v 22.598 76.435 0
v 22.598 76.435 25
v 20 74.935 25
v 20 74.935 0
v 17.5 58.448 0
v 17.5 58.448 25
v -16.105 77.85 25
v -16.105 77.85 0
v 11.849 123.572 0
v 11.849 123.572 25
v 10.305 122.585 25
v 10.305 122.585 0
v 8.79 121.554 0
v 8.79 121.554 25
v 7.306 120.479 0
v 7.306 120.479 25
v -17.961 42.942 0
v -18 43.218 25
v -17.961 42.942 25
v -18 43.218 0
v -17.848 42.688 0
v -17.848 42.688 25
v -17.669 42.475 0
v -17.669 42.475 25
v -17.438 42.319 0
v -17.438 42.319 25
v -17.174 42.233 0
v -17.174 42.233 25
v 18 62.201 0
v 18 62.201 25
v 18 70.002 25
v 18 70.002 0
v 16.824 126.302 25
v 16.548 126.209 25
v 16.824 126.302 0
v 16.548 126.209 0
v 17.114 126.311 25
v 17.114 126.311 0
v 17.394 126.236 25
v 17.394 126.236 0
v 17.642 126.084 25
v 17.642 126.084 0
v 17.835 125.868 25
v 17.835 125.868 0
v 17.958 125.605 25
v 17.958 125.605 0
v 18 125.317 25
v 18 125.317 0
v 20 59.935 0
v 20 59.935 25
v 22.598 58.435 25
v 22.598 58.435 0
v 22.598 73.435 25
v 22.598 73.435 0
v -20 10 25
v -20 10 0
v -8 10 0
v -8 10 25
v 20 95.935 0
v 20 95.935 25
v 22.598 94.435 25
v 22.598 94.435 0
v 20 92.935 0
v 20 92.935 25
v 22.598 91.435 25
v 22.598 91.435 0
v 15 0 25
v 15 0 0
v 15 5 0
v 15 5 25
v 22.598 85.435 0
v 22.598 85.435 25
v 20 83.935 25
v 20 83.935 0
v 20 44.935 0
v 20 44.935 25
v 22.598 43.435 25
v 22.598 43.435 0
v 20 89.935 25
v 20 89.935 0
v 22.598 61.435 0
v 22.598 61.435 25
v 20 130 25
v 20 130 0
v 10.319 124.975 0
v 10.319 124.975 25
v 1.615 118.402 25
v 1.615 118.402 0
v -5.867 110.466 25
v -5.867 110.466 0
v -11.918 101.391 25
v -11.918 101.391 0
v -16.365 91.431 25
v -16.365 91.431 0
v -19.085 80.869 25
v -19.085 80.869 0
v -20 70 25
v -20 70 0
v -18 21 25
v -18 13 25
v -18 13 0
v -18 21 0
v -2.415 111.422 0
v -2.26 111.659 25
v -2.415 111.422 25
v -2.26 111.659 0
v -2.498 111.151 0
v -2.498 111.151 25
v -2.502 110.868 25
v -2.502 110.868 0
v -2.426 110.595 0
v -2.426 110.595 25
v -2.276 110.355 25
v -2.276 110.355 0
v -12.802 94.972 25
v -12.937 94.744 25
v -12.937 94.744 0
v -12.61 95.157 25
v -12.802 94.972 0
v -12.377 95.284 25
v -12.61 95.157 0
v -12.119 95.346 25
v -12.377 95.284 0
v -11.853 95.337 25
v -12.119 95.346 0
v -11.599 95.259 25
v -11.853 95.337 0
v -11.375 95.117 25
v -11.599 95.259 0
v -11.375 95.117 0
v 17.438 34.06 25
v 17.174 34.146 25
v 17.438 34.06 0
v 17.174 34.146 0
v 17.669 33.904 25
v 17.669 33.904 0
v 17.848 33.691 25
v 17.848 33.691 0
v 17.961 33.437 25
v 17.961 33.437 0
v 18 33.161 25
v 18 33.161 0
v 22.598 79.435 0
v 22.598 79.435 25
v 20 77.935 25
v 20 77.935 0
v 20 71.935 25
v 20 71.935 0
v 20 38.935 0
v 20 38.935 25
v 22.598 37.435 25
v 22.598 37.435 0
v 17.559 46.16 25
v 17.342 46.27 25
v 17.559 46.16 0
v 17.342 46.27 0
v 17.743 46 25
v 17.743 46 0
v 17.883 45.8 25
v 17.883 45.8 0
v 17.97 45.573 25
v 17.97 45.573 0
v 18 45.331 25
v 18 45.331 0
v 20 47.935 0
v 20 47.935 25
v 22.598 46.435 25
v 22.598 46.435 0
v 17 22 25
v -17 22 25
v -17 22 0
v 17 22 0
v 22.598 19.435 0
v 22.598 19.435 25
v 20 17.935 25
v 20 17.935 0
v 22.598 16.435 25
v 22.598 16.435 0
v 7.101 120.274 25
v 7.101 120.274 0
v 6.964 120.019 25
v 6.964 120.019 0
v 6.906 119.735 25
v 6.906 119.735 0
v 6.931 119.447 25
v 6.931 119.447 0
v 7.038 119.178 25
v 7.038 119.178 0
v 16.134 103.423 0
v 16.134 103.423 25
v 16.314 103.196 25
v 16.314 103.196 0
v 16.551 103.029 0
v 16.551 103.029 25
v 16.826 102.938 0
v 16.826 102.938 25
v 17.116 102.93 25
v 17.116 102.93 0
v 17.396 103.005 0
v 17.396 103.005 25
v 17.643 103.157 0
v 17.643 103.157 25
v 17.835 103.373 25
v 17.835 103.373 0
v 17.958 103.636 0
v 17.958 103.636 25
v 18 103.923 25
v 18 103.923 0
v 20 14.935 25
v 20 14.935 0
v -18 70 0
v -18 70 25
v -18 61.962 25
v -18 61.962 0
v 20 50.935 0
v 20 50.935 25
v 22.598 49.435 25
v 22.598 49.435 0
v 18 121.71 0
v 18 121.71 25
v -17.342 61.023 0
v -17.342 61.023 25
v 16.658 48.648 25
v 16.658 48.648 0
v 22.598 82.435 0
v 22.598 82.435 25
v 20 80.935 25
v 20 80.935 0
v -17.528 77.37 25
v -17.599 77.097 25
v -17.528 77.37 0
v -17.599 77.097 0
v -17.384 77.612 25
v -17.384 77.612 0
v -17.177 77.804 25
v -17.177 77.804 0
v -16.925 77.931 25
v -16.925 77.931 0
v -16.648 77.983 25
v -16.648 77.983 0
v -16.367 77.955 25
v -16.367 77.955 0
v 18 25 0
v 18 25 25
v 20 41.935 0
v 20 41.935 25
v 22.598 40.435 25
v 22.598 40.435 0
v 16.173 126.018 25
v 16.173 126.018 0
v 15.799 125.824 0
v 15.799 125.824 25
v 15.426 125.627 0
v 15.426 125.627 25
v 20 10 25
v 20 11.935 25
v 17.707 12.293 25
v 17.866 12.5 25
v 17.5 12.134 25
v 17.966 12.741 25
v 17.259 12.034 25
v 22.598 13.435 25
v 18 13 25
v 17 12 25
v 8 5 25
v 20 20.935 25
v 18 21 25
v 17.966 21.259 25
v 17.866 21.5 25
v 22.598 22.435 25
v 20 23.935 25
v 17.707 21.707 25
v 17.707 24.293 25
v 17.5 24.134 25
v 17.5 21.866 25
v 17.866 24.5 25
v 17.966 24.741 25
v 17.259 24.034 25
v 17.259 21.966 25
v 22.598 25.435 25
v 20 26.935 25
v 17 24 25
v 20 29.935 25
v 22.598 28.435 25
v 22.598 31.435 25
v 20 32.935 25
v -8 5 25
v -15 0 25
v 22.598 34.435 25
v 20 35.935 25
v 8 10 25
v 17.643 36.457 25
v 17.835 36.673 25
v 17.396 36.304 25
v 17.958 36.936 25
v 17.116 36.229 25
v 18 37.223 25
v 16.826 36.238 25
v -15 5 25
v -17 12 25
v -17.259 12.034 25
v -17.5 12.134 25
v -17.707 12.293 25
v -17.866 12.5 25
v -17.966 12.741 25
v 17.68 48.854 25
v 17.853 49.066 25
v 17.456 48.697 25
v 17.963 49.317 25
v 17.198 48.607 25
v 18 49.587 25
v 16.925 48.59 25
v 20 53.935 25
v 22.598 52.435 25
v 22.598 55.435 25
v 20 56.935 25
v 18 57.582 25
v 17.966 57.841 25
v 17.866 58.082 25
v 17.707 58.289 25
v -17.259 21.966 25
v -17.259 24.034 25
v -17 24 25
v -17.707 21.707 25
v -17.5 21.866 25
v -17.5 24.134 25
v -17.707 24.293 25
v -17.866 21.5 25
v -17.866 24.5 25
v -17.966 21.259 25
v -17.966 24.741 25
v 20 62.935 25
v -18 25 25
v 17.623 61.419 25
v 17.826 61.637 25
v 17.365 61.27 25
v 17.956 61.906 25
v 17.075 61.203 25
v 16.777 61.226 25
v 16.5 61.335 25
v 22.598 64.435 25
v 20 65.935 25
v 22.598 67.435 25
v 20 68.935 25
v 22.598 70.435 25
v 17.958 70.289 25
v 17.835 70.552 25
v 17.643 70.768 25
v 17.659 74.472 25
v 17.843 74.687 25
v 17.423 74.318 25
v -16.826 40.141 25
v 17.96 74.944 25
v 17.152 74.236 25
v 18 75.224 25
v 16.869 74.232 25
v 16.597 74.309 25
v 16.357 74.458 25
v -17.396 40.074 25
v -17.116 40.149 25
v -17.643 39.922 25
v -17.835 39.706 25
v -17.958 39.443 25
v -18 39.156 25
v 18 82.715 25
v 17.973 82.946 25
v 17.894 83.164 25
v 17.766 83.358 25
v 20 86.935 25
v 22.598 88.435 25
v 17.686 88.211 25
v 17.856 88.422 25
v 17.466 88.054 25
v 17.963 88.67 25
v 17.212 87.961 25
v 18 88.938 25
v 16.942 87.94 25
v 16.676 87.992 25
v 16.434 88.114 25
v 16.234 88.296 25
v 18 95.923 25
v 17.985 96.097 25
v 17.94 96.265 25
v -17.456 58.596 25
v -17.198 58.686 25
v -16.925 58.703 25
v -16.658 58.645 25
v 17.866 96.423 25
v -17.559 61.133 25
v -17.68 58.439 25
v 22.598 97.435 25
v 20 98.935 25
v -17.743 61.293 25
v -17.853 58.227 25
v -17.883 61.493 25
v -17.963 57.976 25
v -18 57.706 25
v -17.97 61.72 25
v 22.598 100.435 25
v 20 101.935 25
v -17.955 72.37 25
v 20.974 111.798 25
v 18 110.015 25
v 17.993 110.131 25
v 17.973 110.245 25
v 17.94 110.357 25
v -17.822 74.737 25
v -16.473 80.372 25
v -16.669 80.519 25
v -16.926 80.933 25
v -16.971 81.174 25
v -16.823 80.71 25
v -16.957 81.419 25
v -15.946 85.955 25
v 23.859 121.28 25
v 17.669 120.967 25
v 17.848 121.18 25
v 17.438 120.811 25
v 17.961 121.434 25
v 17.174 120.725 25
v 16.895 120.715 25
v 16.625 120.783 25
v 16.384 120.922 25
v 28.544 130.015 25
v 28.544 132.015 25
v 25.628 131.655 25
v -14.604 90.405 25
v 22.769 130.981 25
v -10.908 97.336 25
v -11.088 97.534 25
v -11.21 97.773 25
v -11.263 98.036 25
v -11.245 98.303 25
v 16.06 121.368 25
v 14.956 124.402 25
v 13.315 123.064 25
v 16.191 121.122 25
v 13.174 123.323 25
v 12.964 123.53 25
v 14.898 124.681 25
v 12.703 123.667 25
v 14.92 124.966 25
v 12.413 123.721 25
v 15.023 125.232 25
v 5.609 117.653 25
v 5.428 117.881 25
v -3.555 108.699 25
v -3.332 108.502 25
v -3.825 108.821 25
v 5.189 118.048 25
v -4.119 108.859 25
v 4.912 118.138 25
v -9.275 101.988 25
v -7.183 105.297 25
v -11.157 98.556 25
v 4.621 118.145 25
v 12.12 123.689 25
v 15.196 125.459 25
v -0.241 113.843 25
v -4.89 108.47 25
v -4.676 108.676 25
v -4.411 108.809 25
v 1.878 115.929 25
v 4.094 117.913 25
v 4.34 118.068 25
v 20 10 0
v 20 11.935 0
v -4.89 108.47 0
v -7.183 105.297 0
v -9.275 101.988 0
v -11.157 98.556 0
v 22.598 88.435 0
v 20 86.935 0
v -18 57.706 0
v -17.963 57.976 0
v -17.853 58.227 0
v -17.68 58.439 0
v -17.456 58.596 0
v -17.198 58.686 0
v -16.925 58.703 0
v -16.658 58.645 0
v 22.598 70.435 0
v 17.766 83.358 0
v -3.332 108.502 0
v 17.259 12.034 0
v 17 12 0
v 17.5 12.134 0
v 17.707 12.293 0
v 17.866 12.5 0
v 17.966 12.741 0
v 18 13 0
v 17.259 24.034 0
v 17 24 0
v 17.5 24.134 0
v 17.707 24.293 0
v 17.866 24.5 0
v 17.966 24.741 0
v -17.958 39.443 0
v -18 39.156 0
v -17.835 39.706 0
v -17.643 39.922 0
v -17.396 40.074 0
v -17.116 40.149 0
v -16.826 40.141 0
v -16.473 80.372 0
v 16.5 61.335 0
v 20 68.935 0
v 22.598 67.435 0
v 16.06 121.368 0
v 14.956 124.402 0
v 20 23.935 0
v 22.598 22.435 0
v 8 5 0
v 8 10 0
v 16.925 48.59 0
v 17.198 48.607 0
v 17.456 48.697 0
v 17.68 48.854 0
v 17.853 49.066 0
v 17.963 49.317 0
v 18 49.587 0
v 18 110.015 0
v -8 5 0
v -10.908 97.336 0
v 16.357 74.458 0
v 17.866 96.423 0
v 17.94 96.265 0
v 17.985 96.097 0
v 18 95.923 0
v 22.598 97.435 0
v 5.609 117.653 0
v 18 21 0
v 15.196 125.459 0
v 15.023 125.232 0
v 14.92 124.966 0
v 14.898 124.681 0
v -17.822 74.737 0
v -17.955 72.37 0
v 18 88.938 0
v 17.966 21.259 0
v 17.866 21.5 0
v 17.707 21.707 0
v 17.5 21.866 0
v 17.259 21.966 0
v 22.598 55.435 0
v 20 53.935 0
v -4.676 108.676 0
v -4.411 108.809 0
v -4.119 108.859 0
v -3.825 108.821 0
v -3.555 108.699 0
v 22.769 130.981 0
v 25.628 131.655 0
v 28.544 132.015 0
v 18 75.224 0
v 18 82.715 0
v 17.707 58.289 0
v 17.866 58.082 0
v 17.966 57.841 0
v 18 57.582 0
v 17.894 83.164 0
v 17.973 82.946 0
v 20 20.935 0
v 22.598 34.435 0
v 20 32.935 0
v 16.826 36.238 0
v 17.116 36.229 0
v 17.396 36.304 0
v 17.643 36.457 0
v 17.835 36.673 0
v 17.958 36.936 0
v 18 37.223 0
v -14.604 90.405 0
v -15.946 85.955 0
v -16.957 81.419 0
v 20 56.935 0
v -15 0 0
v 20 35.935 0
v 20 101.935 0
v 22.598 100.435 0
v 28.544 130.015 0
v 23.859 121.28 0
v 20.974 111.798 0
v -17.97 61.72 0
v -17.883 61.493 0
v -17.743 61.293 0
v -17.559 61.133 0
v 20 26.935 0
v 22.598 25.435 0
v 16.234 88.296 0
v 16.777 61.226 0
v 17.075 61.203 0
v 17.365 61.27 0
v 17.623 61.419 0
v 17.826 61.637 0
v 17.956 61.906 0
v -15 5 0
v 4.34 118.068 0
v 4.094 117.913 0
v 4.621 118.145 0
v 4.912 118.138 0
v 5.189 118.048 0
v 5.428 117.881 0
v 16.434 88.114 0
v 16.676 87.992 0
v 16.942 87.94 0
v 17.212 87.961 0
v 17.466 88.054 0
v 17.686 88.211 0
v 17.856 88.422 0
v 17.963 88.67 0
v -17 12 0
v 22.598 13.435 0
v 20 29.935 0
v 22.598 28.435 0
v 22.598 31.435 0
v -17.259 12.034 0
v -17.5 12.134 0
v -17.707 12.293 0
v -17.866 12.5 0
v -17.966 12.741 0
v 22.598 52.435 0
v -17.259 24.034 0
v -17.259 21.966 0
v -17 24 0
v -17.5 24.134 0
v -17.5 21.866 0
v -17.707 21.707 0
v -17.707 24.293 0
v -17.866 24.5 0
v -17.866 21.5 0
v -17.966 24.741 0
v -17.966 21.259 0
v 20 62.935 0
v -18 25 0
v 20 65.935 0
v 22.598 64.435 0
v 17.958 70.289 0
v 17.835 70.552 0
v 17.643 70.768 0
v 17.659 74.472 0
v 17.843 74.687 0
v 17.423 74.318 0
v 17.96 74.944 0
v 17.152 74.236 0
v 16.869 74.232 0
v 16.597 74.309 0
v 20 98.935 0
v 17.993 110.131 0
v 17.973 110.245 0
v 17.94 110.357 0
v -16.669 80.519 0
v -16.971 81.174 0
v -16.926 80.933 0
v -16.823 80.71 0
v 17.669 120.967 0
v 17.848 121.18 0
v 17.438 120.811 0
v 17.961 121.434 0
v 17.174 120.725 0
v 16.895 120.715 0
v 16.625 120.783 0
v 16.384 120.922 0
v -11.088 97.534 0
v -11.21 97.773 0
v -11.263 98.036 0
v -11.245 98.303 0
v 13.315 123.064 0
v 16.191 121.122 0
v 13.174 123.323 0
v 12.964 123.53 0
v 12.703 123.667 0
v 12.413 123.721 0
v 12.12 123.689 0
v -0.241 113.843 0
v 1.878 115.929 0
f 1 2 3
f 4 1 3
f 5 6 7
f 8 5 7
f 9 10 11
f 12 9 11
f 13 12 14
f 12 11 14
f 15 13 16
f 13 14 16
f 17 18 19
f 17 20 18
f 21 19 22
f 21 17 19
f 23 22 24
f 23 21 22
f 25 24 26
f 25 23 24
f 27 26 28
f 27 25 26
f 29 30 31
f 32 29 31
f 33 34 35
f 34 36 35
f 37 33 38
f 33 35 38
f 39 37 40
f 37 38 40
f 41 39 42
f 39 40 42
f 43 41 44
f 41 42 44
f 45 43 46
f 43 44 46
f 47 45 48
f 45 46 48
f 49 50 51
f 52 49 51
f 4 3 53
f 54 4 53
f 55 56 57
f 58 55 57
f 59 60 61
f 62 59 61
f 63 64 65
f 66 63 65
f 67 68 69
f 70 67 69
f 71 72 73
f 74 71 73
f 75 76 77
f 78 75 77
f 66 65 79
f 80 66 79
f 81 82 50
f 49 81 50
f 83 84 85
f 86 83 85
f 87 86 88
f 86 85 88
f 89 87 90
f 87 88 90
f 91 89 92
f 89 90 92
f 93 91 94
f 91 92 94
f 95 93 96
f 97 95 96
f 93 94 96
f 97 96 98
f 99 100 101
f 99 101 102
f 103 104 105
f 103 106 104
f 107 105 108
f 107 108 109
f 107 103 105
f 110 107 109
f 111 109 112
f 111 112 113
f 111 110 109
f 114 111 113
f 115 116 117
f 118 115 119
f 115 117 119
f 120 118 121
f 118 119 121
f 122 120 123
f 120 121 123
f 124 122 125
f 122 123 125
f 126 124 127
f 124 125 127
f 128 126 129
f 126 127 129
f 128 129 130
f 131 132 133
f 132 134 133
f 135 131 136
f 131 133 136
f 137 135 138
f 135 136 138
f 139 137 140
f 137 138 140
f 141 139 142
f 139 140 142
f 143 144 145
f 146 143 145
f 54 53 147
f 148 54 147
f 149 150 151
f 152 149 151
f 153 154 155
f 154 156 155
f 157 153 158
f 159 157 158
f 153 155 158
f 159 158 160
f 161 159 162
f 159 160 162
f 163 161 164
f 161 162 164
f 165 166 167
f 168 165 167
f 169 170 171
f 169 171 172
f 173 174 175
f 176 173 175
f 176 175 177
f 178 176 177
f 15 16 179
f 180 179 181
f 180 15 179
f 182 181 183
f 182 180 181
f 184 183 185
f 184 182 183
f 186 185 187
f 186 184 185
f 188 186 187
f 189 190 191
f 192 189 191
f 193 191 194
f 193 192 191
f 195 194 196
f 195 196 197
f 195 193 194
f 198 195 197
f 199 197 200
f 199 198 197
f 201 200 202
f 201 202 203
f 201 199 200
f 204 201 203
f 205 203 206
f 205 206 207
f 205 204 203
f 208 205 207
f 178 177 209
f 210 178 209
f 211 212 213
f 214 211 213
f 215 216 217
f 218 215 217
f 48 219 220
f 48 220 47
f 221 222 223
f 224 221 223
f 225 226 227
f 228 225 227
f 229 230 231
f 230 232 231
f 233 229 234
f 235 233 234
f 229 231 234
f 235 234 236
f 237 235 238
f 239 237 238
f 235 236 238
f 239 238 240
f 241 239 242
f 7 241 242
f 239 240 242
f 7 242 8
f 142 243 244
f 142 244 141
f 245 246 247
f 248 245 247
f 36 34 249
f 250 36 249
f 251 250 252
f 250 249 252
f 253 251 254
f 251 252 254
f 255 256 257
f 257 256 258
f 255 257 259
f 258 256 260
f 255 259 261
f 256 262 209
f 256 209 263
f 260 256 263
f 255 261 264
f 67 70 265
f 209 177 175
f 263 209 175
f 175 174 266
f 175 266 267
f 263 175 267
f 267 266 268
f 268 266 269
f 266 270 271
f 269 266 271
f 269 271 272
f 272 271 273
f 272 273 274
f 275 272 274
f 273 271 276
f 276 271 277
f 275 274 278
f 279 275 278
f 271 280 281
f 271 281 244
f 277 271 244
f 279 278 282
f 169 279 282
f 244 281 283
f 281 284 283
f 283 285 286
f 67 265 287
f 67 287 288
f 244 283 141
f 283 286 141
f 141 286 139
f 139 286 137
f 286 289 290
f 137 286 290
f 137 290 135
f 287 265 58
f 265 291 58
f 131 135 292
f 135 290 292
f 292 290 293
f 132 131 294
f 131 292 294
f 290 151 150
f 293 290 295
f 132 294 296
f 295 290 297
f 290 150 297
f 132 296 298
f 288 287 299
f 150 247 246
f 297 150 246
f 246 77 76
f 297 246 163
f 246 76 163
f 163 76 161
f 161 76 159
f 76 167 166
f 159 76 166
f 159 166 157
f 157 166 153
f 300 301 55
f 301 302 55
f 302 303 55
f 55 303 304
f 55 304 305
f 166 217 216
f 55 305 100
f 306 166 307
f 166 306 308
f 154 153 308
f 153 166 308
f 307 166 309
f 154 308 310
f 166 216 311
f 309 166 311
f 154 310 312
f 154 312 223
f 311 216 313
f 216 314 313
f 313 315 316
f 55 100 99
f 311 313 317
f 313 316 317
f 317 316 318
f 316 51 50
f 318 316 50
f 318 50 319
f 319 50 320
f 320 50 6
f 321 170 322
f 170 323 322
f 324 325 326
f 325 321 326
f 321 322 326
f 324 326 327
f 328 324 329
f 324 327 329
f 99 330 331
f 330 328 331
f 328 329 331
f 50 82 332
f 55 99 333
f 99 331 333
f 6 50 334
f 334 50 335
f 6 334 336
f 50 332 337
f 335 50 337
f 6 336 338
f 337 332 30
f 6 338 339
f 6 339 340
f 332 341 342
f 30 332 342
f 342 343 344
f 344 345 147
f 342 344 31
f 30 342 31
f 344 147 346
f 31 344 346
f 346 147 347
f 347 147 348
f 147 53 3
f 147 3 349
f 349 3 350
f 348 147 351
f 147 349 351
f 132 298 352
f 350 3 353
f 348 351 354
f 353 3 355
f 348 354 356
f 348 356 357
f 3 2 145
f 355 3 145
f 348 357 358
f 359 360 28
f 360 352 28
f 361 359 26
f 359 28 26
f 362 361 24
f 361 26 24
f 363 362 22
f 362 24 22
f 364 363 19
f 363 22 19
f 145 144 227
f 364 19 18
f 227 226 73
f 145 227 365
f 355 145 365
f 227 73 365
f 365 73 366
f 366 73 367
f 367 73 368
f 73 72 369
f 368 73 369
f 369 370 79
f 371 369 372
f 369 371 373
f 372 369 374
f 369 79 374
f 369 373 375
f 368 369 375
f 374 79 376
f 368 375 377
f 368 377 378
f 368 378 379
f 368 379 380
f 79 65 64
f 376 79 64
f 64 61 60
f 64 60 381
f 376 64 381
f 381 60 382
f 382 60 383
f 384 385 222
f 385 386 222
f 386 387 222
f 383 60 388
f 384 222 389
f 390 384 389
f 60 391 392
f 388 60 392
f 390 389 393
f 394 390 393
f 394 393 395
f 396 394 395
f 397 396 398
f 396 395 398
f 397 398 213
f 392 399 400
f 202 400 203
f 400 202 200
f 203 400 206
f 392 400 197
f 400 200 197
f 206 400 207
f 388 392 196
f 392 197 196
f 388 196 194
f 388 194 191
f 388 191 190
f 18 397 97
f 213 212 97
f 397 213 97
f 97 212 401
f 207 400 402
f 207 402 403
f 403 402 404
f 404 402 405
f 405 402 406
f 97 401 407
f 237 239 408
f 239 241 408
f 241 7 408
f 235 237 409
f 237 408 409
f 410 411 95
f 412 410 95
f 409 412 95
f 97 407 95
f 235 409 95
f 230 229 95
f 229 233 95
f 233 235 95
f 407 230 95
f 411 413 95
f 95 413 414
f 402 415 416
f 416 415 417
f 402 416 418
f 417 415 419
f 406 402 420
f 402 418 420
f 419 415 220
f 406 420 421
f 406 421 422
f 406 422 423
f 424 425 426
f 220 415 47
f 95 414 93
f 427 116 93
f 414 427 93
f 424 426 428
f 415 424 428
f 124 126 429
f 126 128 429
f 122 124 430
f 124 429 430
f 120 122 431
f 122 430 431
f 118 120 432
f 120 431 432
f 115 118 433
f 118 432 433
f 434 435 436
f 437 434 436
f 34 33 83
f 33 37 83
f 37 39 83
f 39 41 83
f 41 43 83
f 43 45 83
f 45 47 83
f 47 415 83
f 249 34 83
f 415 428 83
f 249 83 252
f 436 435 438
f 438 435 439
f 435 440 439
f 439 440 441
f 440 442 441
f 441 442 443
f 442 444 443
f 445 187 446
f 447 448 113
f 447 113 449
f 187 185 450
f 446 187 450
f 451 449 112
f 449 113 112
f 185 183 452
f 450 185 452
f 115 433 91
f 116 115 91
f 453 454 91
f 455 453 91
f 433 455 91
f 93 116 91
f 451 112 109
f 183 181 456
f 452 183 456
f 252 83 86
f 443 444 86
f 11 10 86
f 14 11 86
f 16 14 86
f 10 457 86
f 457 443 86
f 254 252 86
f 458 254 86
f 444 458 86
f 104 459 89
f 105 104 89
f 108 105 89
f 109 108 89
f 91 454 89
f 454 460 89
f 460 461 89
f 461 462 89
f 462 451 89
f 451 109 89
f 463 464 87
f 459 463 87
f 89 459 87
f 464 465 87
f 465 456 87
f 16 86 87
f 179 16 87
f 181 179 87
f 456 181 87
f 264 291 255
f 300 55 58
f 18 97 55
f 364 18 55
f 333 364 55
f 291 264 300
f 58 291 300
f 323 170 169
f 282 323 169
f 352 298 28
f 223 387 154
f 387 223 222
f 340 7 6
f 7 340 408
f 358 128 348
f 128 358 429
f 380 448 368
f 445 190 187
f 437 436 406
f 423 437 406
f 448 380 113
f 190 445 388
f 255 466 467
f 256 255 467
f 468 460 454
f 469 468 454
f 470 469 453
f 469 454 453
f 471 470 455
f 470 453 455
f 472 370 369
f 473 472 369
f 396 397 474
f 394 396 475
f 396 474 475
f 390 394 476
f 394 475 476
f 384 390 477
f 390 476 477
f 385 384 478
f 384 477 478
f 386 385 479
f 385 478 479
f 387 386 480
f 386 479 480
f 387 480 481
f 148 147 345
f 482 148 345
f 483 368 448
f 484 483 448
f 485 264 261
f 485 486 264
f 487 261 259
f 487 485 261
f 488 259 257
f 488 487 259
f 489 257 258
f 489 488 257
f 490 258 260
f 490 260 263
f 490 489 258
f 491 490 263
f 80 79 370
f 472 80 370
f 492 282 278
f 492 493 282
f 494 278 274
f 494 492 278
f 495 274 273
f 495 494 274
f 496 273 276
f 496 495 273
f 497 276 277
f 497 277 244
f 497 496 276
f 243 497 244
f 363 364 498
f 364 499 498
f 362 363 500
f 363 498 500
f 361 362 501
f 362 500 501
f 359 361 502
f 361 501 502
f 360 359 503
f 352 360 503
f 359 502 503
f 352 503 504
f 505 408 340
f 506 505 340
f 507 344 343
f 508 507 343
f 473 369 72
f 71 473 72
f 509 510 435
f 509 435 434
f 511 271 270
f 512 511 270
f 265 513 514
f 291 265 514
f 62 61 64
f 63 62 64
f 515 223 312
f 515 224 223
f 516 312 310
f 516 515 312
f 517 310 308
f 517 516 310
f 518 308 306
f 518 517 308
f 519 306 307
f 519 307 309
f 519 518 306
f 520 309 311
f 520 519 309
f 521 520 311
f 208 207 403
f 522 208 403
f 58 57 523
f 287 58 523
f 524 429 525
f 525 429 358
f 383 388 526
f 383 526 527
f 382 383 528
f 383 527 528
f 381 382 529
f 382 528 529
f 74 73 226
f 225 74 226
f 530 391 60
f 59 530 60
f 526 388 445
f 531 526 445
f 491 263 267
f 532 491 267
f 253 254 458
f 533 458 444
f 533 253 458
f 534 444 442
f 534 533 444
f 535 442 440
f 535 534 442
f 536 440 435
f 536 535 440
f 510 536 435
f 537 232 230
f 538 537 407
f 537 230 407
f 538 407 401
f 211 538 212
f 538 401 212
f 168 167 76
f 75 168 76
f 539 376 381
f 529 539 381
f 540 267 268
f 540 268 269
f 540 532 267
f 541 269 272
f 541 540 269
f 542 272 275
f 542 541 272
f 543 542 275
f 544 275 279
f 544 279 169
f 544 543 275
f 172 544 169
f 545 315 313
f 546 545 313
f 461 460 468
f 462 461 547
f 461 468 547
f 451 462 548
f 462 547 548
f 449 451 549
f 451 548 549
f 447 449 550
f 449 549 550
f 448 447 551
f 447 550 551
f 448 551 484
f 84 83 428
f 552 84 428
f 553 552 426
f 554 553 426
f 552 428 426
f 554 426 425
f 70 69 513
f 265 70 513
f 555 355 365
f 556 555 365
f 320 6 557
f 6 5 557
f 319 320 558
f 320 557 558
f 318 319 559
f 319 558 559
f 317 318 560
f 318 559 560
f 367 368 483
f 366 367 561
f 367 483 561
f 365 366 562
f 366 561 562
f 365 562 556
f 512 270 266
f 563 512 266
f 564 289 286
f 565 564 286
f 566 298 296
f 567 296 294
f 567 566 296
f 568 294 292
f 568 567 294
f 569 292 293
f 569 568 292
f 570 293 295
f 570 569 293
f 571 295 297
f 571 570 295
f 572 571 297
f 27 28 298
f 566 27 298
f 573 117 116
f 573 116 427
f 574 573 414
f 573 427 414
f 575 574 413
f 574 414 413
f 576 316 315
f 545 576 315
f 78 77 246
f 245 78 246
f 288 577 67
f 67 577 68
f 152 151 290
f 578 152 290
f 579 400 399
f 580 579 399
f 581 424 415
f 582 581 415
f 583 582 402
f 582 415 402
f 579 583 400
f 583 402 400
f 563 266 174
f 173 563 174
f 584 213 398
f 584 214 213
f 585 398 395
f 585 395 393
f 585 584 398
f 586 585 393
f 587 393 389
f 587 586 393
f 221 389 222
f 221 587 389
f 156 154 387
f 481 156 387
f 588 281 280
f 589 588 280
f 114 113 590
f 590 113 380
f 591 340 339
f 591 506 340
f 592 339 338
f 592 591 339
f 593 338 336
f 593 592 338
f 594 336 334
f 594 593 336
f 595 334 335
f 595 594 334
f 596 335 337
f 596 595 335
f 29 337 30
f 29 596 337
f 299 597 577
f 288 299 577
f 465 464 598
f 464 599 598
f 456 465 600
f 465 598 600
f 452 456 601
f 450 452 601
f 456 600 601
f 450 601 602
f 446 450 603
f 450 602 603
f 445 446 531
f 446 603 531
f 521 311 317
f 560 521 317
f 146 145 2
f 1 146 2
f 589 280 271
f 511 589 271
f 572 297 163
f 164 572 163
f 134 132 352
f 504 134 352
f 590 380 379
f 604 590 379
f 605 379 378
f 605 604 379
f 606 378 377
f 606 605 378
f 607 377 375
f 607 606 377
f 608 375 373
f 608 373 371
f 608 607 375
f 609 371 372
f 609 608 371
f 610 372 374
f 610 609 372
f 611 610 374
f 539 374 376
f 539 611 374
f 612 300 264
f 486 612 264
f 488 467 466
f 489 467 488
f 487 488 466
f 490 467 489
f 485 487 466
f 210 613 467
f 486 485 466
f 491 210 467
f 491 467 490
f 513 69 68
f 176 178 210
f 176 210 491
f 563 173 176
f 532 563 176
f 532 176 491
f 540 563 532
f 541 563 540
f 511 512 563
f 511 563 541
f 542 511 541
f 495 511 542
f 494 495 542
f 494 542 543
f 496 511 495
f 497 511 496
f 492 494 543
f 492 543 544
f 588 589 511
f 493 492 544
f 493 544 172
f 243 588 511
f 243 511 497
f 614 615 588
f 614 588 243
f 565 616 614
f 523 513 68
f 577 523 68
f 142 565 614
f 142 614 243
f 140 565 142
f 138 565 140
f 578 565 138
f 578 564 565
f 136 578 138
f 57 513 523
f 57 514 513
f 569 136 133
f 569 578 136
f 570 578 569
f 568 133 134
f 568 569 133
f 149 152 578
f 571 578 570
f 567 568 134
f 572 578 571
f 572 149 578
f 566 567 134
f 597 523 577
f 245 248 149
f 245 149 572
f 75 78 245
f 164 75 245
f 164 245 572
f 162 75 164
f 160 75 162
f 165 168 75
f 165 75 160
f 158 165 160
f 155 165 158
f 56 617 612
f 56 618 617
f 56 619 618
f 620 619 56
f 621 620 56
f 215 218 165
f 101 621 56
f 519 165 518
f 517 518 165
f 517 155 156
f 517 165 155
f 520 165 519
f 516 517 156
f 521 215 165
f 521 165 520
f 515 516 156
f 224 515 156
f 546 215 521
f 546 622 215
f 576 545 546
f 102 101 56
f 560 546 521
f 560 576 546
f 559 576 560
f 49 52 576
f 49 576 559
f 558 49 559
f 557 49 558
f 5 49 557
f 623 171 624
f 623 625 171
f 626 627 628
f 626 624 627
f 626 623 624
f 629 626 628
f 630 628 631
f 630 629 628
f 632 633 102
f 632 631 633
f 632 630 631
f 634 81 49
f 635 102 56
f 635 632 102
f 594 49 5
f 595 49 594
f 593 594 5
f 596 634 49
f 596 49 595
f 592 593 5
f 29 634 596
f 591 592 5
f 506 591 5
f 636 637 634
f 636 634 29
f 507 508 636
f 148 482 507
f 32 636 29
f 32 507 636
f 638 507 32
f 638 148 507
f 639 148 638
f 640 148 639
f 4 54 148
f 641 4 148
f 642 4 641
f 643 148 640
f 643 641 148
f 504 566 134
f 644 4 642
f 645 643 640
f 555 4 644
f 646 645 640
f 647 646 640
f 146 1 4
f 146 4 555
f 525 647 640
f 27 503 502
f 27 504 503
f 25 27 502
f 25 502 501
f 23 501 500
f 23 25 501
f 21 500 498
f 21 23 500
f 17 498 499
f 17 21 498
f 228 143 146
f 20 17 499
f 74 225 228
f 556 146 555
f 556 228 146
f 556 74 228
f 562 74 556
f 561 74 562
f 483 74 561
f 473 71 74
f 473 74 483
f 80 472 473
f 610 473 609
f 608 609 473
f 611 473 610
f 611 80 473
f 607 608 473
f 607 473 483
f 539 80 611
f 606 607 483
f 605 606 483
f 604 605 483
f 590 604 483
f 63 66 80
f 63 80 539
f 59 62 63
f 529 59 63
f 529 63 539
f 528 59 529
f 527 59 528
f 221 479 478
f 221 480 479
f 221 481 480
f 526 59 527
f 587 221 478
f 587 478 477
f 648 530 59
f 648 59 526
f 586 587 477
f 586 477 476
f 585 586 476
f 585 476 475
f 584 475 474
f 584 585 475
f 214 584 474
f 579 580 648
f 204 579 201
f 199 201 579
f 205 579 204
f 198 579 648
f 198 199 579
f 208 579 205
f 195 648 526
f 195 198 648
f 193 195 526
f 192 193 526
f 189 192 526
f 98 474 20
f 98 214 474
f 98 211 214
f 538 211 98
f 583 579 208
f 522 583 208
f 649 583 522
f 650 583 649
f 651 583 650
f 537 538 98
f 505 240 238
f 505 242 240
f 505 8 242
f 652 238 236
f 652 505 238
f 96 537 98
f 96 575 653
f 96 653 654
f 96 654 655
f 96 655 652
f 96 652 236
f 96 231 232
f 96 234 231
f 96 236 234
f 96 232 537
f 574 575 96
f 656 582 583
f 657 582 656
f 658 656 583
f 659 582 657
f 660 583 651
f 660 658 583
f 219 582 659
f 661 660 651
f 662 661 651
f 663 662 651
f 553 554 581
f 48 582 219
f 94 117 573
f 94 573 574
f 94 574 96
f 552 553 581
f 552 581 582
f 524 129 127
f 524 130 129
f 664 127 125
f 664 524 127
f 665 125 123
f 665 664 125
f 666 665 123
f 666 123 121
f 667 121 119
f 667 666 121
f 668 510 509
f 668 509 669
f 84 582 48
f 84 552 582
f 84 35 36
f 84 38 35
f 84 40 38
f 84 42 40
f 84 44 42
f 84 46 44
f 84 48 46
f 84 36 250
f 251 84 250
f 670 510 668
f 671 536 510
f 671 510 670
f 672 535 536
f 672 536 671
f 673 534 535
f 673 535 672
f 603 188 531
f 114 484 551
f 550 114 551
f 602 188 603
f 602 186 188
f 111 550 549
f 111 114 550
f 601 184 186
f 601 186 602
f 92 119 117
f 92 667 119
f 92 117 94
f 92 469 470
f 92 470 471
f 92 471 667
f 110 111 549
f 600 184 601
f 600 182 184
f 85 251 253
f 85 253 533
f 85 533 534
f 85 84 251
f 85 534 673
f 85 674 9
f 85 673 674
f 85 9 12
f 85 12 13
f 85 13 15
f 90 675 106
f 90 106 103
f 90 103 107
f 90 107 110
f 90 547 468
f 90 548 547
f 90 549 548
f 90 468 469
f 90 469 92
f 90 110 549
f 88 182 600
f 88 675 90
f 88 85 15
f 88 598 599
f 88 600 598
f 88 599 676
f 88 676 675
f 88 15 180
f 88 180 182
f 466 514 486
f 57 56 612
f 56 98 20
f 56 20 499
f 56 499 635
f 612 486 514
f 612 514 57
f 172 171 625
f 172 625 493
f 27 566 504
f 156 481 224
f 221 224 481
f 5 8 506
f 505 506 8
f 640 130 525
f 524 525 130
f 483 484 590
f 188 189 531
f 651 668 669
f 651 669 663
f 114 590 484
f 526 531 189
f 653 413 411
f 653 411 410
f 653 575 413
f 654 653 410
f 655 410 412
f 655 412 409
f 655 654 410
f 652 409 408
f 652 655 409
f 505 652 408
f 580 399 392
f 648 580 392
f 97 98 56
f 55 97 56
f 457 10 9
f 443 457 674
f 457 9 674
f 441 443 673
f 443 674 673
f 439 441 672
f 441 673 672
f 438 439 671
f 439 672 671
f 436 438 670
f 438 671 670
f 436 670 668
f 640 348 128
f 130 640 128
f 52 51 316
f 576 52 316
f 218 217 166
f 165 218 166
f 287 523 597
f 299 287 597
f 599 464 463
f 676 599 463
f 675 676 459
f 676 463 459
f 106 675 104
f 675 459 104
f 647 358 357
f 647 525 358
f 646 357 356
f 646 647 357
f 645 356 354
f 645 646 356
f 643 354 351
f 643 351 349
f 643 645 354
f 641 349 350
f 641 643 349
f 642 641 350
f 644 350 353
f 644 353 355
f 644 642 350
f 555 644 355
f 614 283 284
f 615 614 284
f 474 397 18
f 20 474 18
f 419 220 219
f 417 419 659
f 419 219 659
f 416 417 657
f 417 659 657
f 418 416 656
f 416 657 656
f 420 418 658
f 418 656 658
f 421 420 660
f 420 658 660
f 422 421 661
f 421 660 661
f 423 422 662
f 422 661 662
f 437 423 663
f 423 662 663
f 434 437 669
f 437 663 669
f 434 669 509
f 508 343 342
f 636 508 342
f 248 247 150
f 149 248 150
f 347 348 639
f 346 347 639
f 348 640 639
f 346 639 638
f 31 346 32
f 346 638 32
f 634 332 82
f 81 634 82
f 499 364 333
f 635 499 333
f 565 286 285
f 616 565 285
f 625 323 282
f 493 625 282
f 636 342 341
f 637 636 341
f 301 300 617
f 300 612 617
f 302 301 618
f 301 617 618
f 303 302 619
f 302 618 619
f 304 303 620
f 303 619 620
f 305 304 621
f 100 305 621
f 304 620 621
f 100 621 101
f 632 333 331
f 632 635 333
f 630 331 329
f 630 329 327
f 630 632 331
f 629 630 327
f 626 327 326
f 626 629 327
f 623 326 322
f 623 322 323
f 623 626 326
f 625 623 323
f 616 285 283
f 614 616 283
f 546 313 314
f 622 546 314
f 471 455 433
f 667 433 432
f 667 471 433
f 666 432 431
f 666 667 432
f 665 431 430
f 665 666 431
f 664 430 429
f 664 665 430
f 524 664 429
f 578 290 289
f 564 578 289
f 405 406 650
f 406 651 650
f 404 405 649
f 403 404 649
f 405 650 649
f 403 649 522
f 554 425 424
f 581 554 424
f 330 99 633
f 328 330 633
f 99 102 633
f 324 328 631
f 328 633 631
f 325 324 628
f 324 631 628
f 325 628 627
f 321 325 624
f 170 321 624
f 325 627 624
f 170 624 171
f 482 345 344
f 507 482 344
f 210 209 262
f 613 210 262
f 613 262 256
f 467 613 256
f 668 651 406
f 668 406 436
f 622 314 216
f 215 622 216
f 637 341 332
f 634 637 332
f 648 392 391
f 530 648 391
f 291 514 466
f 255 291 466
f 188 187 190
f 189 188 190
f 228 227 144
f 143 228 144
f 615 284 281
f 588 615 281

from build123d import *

# Parameters (mm, degrees)
BOSS_EXTRUDE1_DEPTH = 25
SKETCH3_W           = 36
SKETCH3_H           = 10
CUT_EXTRUDE1_DEPTH  = 134.88427839
CUT_EXTRUDE2_DEPTH  = 134.88427839
CUT_EXTRUDE3_DEPTH  = 134.88427839
CUT_EXTRUDE4_DEPTH  = 134.88427839
BOSS_EXTRUDE2_DEPTH = 25
BOSS_EXTRUDE3_DEPTH = 25
LPATTERN1_COUNT     = 30
LPATTERN1_PITCH     = 3
CUT_EXTRUDE5_DEPTH  = 138.359842306
CUT_EXTRUDE6_DEPTH  = 138.359842306
CUT_EXTRUDE7_DEPTH  = 138.359842306
CUT_EXTRUDE8_DEPTH  = 138.359842306
CUT_EXTRUDE9_DEPTH  = 138.359842306
FILLET1_R           = 1


with BuildPart() as part:
    # Sketch2 → Boss-Extrude1 (new body)
    with BuildSketch(Plane.XY):
        with BuildLine():
            Line((-15, 0), (15, 0))
            Line((15, 0), (15, 5))
            Line((15, 5), (8, 5))
            Line((8, 5), (8, 10))
            Line((8, 10), (20, 10))
            Line((20, 10), (20, 130))
            ThreePointArc((20, 130), (-9.083269132, 106.055512755), (-20, 70))
            Line((-20, 70), (-20, 10))
            Line((-20, 10), (-8, 10))
            Line((-8, 10), (-8, 5))
            Line((-8, 5), (-15, 5))
            Line((-15, 5), (-15, 0))
        make_face()
    extrude(amount=BOSS_EXTRUDE1_DEPTH)

    # Sketch3 → Cut-Extrude1 (cut, through all)
    with BuildSketch(Plane.XY.offset(25)):
        with Locations((0, 17)):
            Rectangle(SKETCH3_W, SKETCH3_H)
    extrude(amount=-CUT_EXTRUDE1_DEPTH, mode=Mode.SUBTRACT)

    # Sketch4 → Cut-Extrude2 (cut, through all)
    with BuildSketch(Plane.XY.offset(25)):
        Polygon((-18, 24), (18, 24), (18, 34), (-18, 40.347771306), align=None)
    extrude(amount=-CUT_EXTRUDE2_DEPTH, mode=Mode.SUBTRACT)

    # Sketch5 → Cut-Extrude3 (cut, through all)
    with BuildSketch(Plane.XY.offset(25)):
        Polygon((-18, 42.378624529), (18, 36.030853224), (18, 46.030853224), (-18, 59.133781657), align=None)
    extrude(amount=-CUT_EXTRUDE3_DEPTH, mode=Mode.SUBTRACT)

    # Sketch6 → Cut-Extrude4 (cut, through all)
    with BuildSketch(Plane.XY.offset(25)):
        with BuildLine():
            Line((-18, 61.262137202), (18, 48.159208769))
            Line((18, 48.159208769), (18, 58.159208769))
            Line((18, 58.159208769), (-17.409830527, 78.603083956))
            ThreePointArc((-17.409830527, 78.603083956), (-17.852284458, 74.311651469), (-18, 70))
            Line((-18, 70), (-18, 61.262137202))
        make_face()
    extrude(amount=-CUT_EXTRUDE4_DEPTH, mode=Mode.SUBTRACT)

    # Sketch13 → Boss-Extrude2 (add)
    with BuildSketch(Plane.XY.offset(25)):
        with BuildLine():
            Line((28.543587015, 132.015112463), (28.543587015, 130.015112463))
            ThreePointArc((28.543587015, 130.015112463), (22.183163486, 116.610368534), (20, 101.934676234))
            Line((20, 101.934676234), (20, 130))
            ThreePointArc((20, 130), (24.189413282, 131.356828362), (28.543587015, 132.015112463))
        make_face()
    extrude(amount=-BOSS_EXTRUDE2_DEPTH)

    # Sketch15 → Boss-Extrude3 (add)
    with BuildSketch(Plane.XY.offset(25)):
        Polygon((20, 101.934676234), (22.598076211, 100.434676234), (20, 98.934676234), align=None)
    boss_extrude3 = extrude(amount=-BOSS_EXTRUDE3_DEPTH)

    # LPattern1: Boss-Extrude3 ×30
    with Locations(*[(0, -i * LPATTERN1_PITCH, 0) for i in range(1, LPATTERN1_COUNT)]):
        add(boss_extrude3)

    # Sketch17 → Cut-Extrude5 (cut, through all)
    with BuildSketch(Plane.XY.offset(25)):
        with BuildLine():
            Line((-17.080813578, 80.722527008), (18, 60.468609845))
            Line((18, 60.468609845), (18, 70.468609845))
            Line((18, 70.468609845), (-12.396357526, 95.974182235))
            ThreePointArc((-12.396357526, 95.974182235), (-15.223349712, 88.497247077), (-17.080813578, 80.722527008))
        make_face()
    extrude(amount=-CUT_EXTRUDE5_DEPTH, mode=Mode.SUBTRACT)

    # Sketch18 → Cut-Extrude6 (cut, through all)
    with BuildSketch(Plane.XY.offset(25)):
        with BuildLine():
            Line((-11.513032555, 97.843799156), (18, 73.079424424))
            Line((18, 73.079424424), (18, 83.079424424))
            Line((18, 83.079424424), (-4.123287406, 109.44493167))
            ThreePointArc((-4.123287406, 109.44493167), (-8.135718614, 103.846645438), (-11.513032555, 97.843799156))
        make_face()
    extrude(amount=-CUT_EXTRUDE6_DEPTH, mode=Mode.SUBTRACT)

    # Sketch19 → Cut-Extrude7 (cut, through all)
    with BuildSketch(Plane.XY.offset(25)):
        with BuildLine():
            Line((-2.825102167, 111.009262402), (18, 86.190872078))
            Line((18, 86.190872078), (18, 96.190872078))
            Line((18, 96.190872078), (5.013768012, 118.68368568))
            ThreePointArc((5.013768012, 118.68368568), (0.926972027, 115.017421131), (-2.825102167, 111.009262402))
        make_face()
    extrude(amount=-CUT_EXTRUDE7_DEPTH, mode=Mode.SUBTRACT)

    # Sketch21 → Cut-Extrude8 (cut, through all)
    with BuildSketch(Plane.XY.offset(25)):
        with BuildLine():
            Line((6.596754137, 119.941873284), (18, 100.190872078))
            Line((18, 100.190872078), (18, 110.190872078))
            Line((18, 110.190872078), (12.898276405, 124.207742456))
            ThreePointArc((12.898276405, 124.207742456), (9.683048128, 122.170038436), (6.596754137, 119.941873284))
        make_face()
    extrude(amount=-CUT_EXTRUDE8_DEPTH, mode=Mode.SUBTRACT)

    # Sketch22 → Cut-Extrude9 (cut, through all)
    with BuildSketch(Plane.XY.offset(25)):
        with BuildLine():
            Line((14.660598632, 125.213410732), (18, 116.038480878))
            Line((18, 116.038480878), (18, 126.920997883))
            ThreePointArc((18, 126.920997883), (16.317589, 126.092060929), (14.660598632, 125.213410732))
        make_face()
    extrude(amount=-CUT_EXTRUDE9_DEPTH, mode=Mode.SUBTRACT)

    # Fillet1
    fillet1_edges = [part.edges().sort_by_distance(p)[0] for p in [
        (18, 70.468609845, 12.5),
        (18, 60.468609845, 12.5),
        (-17.080813578, 80.722527008, 12.5),
        (-12.396357526, 95.974182235, 12.5),
        (-11.513032555, 97.843799156, 12.5),
        (-4.123287406, 109.44493167, 12.5),
        (18, 83.079424424, 12.5),
        (18, 73.079424424, 12.5),
        (18, 96.190872078, 12.5),
        (18, 86.190872078, 12.5),
        (-2.825102167, 111.009262402, 12.5),
        (5.013768012, 118.68368568, 12.5),
        (6.596754137, 119.941873284, 12.5),
        (12.898276405, 124.207742456, 12.5),
        (18, 110.190872078, 12.5),
        (18, 100.190872078, 12.5),
        (14.660598632, 125.213410732, 12.5),
        (18, 126.920997883, 12.5),
        (18, 116.038480878, 12.5),
        (-18, 12, 12.5),
        (-18, 22, 12.5),
        (18, 22, 12.5),
        (18, 12, 12.5),
        (-18, 24, 12.5),
        (-18, 40.347771306, 12.5),
        (18, 34, 12.5),
        (18, 24, 12.5),
        (-18, 42.378624529, 12.5),
        (-18, 59.133781657, 12.5),
        (18, 46.030853224, 12.5),
        (18, 36.030853224, 12.5),
        (-18, 61.262137202, 12.5),
        (-17.409830527, 78.603083956, 12.5),
        (18, 58.159208769, 12.5),
        (18, 48.159208769, 12.5),
    ]]
    fillet(fillet1_edges, radius=FILLET1_R)


solid = part.part
